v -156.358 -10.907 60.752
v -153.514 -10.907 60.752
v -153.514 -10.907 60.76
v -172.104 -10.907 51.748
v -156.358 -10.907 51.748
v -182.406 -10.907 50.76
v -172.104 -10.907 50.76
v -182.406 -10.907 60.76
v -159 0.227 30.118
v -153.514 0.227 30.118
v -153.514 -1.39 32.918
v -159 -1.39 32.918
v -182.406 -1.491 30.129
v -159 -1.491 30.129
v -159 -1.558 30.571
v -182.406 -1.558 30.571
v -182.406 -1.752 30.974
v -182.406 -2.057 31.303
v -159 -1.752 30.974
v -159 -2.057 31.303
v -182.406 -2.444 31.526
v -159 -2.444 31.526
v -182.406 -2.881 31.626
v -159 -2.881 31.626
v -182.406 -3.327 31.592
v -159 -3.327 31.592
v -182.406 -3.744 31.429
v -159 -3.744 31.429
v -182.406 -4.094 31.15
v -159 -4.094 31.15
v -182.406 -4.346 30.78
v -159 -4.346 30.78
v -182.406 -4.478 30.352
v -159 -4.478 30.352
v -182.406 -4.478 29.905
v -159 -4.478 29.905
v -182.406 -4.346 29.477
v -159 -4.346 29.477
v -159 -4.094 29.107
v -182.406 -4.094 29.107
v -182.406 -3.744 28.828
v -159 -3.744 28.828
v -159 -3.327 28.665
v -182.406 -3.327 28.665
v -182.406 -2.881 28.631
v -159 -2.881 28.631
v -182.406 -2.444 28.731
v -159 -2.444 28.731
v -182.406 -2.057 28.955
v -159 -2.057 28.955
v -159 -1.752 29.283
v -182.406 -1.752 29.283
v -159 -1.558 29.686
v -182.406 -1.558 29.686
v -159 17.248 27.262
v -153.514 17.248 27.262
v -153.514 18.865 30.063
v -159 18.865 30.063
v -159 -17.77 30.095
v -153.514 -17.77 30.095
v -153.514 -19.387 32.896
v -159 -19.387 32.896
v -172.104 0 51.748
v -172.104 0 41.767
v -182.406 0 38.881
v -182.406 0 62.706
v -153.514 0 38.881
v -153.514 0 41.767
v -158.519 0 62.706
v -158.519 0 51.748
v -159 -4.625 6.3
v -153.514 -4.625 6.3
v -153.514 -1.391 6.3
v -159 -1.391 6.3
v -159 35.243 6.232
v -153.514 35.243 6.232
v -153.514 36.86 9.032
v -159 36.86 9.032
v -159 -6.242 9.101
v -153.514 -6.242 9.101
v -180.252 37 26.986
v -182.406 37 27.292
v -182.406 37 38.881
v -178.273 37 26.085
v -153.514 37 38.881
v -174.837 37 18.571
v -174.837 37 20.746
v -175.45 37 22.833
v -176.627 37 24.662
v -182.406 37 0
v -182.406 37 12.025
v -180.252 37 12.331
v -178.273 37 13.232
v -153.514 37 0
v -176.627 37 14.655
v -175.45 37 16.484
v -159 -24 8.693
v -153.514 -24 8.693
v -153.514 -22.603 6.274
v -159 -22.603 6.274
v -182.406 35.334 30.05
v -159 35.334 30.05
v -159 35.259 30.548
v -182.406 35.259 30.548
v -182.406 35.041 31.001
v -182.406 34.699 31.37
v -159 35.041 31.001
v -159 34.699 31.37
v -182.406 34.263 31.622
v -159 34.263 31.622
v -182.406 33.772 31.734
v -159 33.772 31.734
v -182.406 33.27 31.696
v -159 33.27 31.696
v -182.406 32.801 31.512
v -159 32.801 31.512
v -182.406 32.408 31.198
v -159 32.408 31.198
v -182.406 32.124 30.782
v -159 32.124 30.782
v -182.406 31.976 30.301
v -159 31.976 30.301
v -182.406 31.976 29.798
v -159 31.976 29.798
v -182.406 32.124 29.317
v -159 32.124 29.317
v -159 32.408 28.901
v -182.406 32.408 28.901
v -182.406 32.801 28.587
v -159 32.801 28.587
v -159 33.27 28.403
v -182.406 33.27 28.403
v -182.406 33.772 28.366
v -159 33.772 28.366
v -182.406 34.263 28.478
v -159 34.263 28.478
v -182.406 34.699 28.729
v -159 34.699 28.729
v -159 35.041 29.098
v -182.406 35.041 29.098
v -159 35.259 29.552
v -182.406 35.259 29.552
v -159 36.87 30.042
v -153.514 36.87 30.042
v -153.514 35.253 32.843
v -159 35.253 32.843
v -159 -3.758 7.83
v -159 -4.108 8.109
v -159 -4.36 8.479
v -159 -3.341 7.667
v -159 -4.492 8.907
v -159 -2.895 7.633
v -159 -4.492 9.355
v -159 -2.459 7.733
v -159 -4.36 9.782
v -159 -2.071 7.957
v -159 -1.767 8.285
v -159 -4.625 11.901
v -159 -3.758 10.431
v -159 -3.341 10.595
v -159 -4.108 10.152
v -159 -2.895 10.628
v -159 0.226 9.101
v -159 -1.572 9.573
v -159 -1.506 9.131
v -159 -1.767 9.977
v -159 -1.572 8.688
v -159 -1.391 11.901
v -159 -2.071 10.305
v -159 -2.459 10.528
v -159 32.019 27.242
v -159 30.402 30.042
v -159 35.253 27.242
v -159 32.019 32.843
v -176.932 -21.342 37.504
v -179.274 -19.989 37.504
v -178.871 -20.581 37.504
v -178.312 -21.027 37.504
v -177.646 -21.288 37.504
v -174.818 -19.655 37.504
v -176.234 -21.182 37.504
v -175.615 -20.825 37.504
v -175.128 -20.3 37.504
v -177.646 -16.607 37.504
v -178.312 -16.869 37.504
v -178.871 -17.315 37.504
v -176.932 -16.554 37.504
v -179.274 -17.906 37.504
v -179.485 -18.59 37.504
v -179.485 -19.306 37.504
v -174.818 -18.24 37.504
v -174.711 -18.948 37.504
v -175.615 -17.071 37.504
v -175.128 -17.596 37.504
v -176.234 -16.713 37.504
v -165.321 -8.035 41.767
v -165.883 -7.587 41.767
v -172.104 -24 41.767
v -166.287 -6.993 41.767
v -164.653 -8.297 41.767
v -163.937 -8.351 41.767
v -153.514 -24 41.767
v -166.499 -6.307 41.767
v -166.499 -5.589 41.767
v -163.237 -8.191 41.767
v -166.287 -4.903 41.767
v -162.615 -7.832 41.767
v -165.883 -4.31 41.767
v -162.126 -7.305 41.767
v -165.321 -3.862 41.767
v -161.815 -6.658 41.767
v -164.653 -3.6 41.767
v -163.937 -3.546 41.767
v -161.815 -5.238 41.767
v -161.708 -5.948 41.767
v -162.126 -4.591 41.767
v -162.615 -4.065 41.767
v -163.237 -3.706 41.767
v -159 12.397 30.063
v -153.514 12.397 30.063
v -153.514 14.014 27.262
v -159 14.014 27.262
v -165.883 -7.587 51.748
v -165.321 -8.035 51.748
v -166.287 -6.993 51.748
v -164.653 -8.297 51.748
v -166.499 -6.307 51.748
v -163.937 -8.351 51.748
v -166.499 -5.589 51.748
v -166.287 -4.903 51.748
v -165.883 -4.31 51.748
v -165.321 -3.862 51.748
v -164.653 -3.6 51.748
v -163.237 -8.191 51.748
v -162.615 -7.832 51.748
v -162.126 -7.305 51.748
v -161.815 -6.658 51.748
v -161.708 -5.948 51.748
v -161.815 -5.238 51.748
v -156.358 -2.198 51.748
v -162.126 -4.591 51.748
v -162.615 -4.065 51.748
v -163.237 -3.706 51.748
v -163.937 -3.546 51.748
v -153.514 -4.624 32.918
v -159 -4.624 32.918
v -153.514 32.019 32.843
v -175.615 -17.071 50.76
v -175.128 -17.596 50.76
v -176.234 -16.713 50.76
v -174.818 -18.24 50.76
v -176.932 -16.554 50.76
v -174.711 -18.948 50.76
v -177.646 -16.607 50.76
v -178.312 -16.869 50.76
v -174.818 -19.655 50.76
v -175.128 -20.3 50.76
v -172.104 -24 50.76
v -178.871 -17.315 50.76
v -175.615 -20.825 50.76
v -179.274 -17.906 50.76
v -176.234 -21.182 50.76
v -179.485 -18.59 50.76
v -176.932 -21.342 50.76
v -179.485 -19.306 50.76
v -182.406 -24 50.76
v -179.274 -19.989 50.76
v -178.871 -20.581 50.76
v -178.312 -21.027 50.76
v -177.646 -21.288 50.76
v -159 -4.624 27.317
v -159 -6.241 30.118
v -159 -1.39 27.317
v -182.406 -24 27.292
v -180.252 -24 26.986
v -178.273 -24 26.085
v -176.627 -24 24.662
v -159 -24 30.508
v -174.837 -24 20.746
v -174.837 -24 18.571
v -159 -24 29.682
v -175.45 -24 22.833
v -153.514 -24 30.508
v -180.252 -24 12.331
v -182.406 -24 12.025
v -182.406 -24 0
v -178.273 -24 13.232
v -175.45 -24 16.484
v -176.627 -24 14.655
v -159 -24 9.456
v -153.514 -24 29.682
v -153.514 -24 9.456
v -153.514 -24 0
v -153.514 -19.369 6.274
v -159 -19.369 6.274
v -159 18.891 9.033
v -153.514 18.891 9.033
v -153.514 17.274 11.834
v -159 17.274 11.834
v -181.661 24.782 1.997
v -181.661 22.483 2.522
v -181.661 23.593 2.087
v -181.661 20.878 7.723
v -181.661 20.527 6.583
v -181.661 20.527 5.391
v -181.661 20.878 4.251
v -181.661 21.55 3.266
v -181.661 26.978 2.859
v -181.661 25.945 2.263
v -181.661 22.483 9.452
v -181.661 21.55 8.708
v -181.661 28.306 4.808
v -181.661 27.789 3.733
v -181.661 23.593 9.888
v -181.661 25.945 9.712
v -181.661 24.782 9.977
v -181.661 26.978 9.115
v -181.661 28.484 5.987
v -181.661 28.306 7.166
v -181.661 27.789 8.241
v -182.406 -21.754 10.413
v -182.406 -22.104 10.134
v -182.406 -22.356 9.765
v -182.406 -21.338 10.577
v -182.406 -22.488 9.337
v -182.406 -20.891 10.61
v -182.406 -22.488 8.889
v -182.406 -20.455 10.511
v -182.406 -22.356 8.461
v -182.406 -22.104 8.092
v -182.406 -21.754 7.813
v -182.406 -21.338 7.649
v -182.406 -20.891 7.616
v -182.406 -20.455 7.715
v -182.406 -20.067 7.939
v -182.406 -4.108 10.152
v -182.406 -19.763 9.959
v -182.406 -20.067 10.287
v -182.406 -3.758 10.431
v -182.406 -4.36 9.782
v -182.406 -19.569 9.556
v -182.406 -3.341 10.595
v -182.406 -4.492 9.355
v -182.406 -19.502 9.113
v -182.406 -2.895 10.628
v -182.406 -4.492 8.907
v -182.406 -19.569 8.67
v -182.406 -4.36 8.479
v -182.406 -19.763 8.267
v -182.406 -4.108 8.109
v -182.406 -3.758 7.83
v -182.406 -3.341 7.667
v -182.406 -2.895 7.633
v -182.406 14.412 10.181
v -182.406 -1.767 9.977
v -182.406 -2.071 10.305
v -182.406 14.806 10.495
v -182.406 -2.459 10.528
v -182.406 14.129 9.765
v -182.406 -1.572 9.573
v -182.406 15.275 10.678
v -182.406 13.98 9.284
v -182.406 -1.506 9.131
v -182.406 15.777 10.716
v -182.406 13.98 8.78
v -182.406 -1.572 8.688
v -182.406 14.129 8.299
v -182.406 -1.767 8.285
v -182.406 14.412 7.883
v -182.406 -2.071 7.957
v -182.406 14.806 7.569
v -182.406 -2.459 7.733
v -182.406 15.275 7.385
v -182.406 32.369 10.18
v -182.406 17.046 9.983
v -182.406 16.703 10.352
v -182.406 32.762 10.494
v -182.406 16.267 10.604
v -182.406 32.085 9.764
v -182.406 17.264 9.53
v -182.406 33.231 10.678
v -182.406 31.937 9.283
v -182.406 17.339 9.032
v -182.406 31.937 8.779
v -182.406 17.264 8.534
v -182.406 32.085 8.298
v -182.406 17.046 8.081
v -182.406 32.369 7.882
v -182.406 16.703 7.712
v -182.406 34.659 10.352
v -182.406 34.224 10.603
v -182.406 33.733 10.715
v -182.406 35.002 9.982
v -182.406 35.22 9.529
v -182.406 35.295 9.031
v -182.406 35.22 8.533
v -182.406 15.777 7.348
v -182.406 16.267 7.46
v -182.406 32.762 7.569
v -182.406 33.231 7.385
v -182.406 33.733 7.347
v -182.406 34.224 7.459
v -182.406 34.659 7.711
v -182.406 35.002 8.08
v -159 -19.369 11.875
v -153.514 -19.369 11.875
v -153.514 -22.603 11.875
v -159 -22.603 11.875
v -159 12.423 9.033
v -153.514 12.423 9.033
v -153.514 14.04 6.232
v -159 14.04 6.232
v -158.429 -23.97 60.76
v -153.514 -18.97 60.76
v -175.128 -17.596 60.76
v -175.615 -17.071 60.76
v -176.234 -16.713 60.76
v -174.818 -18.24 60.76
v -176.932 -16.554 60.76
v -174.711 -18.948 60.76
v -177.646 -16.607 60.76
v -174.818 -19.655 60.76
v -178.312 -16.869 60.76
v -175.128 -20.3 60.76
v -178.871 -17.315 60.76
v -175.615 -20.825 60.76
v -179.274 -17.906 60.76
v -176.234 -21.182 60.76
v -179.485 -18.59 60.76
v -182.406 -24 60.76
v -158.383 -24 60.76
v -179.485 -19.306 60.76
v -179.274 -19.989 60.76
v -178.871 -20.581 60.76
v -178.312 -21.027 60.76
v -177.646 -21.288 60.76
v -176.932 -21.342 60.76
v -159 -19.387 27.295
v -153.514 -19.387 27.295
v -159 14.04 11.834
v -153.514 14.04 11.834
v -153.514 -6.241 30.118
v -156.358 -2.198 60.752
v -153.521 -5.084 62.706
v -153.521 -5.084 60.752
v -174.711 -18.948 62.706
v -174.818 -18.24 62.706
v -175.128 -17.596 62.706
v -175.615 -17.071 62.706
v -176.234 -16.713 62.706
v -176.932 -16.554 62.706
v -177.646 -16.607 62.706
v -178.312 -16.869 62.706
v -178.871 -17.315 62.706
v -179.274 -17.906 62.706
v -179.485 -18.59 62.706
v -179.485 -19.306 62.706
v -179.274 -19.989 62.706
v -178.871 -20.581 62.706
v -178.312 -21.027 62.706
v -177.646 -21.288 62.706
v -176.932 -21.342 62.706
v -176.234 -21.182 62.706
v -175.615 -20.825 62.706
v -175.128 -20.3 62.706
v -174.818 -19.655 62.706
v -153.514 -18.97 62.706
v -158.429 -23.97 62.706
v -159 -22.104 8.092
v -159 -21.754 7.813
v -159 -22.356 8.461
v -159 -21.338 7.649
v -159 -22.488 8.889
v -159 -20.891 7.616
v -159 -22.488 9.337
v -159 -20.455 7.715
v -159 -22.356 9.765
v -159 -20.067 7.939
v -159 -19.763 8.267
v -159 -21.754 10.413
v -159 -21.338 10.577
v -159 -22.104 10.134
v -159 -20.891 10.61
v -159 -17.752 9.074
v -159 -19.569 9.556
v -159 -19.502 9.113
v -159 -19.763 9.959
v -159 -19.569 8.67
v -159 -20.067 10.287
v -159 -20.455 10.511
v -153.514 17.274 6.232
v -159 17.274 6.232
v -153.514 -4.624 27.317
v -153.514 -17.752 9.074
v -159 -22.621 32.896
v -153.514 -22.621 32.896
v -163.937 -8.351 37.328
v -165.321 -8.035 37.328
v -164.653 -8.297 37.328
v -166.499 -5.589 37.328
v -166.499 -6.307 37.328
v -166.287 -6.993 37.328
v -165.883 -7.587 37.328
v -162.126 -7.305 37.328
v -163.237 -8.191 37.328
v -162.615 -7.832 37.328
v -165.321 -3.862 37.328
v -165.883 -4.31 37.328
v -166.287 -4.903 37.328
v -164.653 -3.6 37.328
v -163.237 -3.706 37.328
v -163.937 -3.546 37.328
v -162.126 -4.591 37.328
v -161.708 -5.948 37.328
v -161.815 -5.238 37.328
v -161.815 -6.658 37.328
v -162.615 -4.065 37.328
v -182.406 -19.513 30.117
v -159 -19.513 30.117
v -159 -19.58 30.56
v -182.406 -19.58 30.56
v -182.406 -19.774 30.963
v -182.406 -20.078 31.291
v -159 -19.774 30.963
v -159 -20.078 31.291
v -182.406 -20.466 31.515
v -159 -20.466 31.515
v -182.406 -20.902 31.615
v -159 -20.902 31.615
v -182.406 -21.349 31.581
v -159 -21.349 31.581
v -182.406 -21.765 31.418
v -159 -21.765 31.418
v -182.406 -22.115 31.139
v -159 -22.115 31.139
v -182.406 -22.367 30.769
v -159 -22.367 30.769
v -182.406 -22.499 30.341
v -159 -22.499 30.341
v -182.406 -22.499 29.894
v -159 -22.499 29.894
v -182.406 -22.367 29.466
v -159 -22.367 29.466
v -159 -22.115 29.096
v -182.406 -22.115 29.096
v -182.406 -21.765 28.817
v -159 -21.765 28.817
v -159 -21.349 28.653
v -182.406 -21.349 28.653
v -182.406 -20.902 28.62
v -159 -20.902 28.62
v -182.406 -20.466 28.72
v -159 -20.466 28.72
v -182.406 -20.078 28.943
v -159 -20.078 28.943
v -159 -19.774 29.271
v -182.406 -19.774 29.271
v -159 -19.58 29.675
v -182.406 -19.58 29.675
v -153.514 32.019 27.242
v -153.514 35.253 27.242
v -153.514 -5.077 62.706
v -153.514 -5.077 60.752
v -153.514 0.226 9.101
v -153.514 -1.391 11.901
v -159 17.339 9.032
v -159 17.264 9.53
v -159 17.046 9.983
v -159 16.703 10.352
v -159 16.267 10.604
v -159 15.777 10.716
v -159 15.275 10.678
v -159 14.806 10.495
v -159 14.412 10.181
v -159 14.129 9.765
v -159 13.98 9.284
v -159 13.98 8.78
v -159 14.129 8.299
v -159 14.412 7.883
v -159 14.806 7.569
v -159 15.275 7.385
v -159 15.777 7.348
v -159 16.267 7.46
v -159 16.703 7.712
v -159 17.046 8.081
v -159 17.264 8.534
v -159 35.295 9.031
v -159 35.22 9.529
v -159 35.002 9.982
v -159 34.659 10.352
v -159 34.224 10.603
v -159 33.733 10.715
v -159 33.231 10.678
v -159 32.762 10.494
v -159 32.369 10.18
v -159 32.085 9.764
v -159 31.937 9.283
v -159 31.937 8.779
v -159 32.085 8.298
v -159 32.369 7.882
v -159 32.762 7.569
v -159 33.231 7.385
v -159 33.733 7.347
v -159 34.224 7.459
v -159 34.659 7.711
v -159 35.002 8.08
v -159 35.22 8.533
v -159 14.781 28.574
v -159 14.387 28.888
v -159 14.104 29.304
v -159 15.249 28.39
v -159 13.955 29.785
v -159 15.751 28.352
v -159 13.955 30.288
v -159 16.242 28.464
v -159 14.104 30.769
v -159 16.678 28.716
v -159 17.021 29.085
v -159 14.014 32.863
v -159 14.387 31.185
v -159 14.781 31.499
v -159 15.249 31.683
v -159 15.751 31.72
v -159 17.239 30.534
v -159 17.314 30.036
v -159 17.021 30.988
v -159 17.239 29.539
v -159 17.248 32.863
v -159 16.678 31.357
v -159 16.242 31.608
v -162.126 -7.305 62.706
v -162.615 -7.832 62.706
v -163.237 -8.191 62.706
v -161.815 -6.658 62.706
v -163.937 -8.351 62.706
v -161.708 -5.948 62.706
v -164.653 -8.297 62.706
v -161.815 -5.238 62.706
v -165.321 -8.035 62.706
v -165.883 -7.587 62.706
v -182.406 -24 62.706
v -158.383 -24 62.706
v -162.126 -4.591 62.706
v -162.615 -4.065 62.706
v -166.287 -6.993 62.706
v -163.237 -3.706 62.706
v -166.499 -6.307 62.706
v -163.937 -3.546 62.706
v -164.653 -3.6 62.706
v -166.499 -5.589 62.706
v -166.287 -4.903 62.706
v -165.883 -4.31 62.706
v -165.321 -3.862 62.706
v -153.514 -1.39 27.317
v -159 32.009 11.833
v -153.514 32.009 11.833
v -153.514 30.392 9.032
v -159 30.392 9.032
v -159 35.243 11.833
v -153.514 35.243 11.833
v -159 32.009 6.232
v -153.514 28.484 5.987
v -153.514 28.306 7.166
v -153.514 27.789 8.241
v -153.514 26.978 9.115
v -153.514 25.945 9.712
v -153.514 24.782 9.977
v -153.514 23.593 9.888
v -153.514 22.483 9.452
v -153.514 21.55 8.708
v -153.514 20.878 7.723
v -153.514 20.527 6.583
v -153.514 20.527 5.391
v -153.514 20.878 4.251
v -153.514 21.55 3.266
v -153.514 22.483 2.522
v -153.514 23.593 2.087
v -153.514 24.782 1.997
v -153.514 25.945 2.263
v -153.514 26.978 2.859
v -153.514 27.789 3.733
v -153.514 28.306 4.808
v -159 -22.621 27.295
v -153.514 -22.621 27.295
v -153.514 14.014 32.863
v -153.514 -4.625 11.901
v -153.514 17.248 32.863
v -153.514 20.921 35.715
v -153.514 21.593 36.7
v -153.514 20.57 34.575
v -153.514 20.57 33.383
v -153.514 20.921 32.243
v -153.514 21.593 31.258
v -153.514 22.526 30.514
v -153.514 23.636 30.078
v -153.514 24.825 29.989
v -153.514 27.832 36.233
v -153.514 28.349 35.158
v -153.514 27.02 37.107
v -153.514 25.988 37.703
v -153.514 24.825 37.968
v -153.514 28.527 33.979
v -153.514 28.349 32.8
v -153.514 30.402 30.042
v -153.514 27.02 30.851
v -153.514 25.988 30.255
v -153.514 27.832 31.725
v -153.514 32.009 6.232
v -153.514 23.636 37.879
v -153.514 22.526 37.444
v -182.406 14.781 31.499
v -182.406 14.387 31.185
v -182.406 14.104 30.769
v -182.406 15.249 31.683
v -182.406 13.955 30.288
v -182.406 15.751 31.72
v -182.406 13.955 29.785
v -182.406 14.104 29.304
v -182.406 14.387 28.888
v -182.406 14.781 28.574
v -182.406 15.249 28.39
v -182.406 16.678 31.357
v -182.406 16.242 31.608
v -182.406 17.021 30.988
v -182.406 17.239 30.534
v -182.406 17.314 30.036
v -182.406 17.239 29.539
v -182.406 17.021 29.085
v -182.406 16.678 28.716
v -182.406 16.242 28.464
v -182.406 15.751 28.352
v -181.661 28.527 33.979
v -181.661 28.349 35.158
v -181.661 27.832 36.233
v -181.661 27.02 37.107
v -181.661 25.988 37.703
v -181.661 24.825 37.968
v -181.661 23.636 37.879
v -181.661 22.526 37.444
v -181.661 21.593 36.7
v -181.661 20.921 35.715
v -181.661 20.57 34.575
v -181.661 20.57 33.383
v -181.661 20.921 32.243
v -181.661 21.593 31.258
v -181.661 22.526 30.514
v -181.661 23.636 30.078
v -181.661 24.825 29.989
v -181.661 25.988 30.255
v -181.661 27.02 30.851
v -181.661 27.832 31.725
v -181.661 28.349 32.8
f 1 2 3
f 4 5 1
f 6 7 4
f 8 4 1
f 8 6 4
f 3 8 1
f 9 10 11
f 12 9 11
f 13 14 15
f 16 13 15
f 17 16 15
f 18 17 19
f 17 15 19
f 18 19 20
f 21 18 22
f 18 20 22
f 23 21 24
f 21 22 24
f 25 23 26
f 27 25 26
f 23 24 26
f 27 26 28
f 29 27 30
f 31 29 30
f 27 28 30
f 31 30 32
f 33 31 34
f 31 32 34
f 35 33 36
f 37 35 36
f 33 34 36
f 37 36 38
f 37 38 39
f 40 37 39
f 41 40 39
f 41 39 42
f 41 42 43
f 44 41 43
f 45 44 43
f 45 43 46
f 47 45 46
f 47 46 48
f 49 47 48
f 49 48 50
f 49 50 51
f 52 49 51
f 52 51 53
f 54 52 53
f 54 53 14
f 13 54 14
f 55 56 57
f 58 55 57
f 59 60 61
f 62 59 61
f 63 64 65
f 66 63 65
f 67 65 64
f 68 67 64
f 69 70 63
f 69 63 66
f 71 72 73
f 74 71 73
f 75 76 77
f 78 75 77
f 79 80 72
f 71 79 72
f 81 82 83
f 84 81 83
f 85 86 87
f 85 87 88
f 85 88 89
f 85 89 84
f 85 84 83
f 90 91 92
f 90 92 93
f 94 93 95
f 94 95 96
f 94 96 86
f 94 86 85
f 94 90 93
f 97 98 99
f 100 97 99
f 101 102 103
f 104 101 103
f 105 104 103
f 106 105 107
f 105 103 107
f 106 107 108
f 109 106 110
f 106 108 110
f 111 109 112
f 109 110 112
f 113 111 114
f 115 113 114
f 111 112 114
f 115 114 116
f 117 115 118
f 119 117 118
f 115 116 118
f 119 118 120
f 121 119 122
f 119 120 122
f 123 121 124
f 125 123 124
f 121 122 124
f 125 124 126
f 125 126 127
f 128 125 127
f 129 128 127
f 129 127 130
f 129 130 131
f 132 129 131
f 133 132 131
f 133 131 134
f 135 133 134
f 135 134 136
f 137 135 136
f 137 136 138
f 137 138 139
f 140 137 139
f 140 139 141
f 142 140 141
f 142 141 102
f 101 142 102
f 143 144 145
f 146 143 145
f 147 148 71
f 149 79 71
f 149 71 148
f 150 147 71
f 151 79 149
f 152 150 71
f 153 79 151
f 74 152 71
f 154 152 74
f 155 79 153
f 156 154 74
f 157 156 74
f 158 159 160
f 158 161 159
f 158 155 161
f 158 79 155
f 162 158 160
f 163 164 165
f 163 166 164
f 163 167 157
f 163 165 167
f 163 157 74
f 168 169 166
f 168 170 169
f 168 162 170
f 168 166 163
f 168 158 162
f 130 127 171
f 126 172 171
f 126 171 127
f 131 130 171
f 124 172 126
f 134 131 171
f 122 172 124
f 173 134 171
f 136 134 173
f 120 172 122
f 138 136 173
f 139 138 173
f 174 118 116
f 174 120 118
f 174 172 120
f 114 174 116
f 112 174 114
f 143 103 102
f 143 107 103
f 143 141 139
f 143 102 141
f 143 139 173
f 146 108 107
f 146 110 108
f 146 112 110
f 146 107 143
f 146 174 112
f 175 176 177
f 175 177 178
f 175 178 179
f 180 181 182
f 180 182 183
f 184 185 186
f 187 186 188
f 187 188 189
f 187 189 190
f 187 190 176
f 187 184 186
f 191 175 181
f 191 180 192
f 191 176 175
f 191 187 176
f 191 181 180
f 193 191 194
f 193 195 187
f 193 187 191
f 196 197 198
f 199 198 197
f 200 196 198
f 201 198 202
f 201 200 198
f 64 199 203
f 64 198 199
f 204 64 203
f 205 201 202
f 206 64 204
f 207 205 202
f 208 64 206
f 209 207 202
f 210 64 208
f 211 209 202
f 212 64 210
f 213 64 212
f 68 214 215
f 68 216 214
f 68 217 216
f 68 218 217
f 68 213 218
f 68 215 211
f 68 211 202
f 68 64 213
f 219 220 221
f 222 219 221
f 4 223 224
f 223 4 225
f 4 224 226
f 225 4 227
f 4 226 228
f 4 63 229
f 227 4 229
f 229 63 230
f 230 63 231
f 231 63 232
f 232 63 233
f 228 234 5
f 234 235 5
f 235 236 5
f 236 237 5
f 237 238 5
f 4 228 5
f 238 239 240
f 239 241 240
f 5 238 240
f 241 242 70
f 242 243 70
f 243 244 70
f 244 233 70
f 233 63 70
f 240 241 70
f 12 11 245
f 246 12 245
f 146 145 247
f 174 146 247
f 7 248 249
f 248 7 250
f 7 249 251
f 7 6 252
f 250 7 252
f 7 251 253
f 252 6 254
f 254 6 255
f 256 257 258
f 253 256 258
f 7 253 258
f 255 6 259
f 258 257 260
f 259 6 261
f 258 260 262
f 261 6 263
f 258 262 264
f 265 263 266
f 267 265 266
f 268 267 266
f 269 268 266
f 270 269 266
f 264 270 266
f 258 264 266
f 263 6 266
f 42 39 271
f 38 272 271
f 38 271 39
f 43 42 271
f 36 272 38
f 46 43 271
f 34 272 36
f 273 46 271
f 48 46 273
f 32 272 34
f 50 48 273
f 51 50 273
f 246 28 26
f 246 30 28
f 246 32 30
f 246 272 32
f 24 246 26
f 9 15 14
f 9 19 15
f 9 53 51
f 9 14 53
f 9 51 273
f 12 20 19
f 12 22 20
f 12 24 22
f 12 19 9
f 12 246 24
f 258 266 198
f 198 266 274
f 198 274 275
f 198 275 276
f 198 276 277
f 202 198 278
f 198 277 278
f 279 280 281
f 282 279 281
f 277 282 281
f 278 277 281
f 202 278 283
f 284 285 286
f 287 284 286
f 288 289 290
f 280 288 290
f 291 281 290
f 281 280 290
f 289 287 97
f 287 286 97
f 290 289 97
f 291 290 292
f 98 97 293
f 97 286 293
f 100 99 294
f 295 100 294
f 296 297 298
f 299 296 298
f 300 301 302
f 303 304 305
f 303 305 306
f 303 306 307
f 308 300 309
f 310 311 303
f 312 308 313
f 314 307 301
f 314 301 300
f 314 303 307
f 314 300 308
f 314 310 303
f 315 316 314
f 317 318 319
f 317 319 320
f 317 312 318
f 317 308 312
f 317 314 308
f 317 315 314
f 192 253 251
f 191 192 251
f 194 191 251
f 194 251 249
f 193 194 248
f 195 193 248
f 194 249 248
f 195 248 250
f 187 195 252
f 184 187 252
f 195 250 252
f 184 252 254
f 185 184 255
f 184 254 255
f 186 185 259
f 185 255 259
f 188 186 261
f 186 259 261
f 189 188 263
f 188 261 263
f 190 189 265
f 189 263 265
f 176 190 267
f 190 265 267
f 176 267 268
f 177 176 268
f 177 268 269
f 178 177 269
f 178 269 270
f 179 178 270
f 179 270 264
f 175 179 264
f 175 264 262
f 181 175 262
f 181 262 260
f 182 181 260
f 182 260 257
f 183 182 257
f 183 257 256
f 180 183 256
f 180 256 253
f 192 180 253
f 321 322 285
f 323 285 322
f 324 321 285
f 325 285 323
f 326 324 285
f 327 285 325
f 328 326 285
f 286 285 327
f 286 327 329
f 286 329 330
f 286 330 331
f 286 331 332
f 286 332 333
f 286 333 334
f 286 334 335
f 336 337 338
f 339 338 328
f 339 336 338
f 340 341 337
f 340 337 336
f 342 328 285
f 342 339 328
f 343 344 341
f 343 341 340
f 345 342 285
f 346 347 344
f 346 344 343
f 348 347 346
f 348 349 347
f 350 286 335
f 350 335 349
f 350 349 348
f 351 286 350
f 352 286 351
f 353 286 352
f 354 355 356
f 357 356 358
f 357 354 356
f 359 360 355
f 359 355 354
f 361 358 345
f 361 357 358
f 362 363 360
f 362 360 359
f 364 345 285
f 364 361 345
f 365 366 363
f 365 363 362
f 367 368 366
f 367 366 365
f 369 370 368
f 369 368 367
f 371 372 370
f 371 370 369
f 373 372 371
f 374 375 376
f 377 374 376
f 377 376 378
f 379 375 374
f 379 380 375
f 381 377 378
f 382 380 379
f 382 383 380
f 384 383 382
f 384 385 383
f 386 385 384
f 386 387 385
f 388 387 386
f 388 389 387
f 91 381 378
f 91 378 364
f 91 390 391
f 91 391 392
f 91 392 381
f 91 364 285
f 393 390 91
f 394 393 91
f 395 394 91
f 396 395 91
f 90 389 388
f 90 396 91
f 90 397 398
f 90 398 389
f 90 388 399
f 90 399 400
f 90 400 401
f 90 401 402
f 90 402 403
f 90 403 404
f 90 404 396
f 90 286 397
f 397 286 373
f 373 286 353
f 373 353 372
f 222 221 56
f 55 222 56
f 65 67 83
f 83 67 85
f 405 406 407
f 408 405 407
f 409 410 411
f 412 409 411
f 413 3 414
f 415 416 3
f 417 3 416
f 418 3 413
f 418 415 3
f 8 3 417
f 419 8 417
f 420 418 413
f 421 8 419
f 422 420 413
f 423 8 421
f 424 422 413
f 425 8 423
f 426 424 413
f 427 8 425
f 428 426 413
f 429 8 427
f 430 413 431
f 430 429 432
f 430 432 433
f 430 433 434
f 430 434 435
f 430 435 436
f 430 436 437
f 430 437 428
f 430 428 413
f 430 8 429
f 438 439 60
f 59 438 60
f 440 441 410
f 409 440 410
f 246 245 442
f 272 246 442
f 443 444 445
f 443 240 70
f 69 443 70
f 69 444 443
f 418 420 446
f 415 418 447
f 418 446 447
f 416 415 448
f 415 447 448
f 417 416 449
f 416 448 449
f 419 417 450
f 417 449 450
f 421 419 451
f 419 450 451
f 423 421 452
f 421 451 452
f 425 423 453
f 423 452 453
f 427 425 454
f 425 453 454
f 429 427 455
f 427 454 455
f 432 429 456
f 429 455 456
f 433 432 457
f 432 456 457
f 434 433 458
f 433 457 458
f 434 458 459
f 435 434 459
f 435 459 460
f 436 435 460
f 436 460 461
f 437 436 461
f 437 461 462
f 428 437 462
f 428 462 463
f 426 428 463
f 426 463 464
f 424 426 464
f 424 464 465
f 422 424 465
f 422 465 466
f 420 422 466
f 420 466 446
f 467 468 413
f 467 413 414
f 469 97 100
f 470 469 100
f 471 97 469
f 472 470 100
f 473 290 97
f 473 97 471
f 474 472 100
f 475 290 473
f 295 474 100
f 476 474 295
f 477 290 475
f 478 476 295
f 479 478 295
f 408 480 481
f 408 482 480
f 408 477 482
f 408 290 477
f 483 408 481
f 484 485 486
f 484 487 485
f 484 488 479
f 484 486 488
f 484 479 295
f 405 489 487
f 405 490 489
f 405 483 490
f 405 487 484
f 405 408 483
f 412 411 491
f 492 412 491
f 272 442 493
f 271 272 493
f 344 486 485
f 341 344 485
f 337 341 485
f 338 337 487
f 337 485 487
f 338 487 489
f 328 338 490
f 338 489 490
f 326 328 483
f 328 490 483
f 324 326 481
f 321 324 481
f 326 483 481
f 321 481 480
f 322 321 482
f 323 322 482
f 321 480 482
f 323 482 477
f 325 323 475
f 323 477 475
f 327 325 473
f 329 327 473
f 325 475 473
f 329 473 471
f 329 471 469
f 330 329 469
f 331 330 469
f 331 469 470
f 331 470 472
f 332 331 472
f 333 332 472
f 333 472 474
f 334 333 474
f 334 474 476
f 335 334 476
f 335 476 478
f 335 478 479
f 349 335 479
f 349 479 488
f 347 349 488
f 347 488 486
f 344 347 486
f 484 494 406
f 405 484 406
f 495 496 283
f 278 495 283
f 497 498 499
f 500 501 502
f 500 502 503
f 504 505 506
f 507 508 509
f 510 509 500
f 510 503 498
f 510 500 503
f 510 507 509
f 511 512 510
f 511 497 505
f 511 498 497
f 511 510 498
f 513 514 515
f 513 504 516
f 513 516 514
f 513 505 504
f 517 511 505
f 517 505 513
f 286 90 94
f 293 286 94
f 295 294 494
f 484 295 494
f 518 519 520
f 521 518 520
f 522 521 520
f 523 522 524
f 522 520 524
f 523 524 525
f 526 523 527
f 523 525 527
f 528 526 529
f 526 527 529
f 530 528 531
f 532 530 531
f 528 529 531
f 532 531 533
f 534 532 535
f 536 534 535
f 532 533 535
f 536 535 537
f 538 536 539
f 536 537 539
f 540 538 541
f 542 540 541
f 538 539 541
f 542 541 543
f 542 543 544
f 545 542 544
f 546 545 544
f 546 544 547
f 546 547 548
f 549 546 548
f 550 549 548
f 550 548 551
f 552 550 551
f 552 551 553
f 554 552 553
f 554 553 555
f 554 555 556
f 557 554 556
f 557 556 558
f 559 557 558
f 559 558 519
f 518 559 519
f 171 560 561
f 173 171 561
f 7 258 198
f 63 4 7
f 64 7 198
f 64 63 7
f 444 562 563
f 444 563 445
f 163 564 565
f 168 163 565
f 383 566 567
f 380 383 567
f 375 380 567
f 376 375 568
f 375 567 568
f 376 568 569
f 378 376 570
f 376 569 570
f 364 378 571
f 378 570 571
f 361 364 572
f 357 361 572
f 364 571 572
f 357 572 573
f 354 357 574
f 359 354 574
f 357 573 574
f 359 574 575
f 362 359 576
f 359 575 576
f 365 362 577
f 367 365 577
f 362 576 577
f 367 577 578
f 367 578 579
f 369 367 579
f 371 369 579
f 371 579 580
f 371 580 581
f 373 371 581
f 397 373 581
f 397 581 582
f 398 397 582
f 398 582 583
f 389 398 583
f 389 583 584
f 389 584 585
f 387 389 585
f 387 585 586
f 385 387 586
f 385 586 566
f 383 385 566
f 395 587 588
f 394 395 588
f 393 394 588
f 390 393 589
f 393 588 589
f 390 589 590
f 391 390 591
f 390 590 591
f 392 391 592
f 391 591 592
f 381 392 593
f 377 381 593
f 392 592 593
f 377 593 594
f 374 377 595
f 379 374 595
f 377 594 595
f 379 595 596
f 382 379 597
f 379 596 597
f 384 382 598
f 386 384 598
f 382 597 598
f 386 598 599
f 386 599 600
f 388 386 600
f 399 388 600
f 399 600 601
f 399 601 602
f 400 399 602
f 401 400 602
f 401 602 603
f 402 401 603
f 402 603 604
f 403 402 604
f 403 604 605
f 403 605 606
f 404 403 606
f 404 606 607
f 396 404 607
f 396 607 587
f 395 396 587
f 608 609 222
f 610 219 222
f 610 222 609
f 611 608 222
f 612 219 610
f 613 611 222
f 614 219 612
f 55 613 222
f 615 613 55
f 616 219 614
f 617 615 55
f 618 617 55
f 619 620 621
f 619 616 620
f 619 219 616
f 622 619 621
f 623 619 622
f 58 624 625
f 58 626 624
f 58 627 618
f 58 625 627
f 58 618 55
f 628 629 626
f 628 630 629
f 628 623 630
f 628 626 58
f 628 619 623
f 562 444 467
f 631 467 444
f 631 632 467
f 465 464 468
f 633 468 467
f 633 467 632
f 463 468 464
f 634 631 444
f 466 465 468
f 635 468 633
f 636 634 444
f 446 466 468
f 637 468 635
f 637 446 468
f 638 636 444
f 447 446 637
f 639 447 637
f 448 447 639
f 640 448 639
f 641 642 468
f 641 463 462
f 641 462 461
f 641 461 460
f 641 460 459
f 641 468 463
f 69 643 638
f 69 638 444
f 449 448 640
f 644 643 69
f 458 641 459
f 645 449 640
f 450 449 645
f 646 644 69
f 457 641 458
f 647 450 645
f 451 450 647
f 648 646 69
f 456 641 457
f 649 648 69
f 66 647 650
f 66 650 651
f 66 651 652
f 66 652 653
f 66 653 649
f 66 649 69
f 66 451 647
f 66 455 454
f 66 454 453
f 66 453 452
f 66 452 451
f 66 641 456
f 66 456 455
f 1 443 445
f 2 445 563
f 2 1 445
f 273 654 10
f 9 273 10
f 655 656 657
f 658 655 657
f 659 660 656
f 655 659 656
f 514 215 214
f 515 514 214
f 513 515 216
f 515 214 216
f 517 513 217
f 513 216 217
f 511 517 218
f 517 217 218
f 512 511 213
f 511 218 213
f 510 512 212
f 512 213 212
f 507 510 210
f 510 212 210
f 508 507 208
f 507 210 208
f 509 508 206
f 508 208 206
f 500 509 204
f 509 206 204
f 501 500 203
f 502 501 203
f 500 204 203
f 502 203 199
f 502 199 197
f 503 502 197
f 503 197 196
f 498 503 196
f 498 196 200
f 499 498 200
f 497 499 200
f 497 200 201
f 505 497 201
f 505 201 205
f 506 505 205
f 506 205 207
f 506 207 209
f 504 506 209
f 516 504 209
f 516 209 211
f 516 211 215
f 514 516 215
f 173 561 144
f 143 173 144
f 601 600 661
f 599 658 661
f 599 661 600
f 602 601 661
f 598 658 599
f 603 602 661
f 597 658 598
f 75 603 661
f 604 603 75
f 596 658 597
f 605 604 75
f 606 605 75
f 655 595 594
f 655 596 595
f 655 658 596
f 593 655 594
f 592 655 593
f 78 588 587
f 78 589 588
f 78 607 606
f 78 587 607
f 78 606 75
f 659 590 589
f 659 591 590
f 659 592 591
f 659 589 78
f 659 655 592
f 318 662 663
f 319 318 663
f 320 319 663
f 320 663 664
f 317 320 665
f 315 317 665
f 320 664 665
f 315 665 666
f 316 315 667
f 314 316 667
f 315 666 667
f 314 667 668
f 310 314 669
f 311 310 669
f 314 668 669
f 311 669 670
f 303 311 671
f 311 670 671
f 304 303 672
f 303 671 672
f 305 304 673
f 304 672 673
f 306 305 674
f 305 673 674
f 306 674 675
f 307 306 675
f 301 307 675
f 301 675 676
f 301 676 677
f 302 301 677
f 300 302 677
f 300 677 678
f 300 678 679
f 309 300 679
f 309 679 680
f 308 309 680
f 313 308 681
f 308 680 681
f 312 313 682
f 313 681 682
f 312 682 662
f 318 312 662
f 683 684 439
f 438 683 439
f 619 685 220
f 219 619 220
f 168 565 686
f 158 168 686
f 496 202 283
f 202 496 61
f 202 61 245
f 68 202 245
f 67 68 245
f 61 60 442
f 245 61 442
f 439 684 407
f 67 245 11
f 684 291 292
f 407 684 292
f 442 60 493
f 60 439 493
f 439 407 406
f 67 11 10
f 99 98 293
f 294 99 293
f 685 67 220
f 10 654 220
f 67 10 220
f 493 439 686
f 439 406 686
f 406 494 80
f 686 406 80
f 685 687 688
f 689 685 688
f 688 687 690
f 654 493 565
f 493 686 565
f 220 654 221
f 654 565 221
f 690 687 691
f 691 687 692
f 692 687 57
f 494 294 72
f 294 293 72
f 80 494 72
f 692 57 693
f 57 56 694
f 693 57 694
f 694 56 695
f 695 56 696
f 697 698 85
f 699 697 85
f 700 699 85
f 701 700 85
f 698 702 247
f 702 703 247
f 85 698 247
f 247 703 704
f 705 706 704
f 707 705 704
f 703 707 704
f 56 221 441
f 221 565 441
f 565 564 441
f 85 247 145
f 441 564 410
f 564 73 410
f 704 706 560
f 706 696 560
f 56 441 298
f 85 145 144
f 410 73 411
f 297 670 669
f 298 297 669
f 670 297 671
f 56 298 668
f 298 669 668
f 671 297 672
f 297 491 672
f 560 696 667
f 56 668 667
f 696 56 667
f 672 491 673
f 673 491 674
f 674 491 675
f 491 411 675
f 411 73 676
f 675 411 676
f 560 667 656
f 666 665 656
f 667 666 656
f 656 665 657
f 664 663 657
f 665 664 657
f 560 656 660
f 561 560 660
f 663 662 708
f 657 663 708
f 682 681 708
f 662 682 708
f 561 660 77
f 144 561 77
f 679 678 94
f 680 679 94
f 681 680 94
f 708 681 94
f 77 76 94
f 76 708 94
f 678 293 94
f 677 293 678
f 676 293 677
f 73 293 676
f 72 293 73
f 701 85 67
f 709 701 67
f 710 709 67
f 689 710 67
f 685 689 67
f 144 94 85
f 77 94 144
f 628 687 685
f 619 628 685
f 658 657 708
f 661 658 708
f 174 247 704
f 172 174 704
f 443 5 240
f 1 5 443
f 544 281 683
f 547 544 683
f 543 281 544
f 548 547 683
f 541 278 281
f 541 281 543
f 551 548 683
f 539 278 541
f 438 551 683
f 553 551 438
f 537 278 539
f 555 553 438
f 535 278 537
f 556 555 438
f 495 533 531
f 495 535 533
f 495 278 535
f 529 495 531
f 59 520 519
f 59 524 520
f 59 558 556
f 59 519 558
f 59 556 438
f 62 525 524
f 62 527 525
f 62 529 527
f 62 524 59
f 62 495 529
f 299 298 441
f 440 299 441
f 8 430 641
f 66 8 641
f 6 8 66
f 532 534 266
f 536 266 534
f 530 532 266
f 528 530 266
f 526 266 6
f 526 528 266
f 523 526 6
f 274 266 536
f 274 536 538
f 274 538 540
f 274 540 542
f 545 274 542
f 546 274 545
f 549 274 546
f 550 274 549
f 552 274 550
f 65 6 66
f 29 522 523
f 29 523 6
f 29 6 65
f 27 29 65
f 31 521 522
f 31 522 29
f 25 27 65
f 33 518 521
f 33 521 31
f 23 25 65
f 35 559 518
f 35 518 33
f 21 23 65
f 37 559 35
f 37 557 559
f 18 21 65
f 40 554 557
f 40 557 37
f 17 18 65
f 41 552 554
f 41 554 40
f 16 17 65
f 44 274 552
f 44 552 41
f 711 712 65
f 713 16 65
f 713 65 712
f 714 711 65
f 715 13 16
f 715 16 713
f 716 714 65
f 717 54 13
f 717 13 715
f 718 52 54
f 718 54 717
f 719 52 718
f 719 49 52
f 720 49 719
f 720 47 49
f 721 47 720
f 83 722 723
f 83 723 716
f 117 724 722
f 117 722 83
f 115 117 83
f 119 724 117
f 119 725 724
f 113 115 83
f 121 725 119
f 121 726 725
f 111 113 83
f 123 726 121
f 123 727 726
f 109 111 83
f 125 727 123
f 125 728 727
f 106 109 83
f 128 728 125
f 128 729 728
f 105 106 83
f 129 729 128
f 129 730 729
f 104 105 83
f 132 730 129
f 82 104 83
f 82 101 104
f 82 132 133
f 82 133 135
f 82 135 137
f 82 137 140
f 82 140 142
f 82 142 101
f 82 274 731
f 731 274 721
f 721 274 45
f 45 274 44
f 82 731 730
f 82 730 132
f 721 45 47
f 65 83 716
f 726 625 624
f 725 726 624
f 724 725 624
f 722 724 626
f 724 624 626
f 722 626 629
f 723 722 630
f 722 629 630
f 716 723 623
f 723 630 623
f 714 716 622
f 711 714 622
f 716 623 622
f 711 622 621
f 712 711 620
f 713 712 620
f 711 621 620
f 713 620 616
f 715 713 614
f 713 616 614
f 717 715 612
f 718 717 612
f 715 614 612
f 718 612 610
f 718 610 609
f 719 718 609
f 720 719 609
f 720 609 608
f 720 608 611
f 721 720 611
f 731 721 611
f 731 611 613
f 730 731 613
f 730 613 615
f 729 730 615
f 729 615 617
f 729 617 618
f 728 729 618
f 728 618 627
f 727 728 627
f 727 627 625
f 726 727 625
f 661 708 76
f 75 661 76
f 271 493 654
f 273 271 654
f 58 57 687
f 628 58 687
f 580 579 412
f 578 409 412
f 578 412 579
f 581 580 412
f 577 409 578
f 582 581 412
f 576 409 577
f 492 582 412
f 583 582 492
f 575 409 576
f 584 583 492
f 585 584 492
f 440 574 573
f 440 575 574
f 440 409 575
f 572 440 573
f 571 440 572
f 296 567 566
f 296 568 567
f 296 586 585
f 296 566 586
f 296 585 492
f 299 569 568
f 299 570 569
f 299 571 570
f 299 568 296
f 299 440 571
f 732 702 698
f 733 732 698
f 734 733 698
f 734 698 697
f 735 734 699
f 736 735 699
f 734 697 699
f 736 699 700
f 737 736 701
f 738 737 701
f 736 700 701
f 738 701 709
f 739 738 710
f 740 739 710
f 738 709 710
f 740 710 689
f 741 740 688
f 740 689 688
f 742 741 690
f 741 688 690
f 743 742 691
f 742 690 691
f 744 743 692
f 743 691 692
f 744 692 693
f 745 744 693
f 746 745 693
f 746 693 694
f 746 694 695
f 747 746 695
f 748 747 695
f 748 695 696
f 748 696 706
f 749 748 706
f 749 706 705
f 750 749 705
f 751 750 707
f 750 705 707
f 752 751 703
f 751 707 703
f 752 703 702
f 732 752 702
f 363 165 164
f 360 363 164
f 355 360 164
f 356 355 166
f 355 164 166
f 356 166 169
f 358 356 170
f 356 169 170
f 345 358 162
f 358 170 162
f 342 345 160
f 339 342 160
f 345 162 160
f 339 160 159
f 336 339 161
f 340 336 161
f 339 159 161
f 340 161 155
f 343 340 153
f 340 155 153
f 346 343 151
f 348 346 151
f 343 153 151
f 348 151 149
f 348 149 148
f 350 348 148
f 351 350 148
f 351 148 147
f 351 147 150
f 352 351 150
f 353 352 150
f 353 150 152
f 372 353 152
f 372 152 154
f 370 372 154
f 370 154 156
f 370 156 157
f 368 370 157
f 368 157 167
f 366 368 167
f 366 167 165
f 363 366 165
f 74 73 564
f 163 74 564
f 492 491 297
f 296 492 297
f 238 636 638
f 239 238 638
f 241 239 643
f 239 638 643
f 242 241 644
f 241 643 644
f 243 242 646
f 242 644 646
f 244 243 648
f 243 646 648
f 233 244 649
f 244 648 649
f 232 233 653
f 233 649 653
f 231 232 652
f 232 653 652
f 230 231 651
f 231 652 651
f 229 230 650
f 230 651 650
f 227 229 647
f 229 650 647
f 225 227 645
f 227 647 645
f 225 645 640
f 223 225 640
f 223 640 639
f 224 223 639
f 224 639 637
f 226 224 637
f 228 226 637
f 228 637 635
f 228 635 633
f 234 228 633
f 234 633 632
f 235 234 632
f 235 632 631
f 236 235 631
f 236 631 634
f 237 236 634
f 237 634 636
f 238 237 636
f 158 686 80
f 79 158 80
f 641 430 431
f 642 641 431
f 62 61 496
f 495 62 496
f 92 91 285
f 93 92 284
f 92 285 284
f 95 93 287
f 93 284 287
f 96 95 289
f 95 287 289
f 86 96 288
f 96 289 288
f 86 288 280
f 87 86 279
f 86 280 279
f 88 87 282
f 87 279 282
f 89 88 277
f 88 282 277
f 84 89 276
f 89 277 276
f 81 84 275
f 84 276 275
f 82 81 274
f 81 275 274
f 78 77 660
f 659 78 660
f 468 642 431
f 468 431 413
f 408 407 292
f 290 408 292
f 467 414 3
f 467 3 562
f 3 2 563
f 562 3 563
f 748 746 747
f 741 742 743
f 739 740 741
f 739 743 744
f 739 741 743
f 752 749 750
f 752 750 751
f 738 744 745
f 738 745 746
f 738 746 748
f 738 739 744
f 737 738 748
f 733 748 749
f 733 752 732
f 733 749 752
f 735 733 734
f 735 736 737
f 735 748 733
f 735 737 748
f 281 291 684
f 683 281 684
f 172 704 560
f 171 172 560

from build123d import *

# Parameters (mm, degrees)
SKETCH_W             = 28.891708
SKETCH_H             = 61.000002
PAD_DEPTH            = 64.706
POCKET_DEPTH         = 5.486
SKETCH002_R          = 4.000759
SKETCH002_R_2        = 4.000904
POCKET013_DEPTH      = 28.147
SKETCH003_R          = 7.633881
POCKET014_DEPTH      = 90
SKETCH004_R          = 1.501587
SKETCH004_R_2        = 1.6888463945
SKETCH004_R_3        = 1.688846
POCKET015_DEPTH      = 71
SKETCH005_W          = 61.94006
SKETCH005_H          = 58.87719
POCKET016_DEPTH      = 34
SKETCH006_W          = 11.564612
SKETCH006_H          = 9.981083
POCKET017_DEPTH      = 18.59
POCKET018_DEPTH      = 14
SKETCH008_W          = 13.093784
SKETCH008_H          = 9.999417
POCKET019_DEPTH      = 38
POCKET019_FACE20_W   = 18.59
POCKET019_FACE20_H   = 9.981083
POCKET020_DEPTH      = 21
SKETCH009_R          = 2.400503
POCKET021_DEPTH      = 27.202
SKETCH010_R          = 2.409031
POCKET022_DEPTH      = 27.378
SKETCH011_W          = 3.434418
SKETCH011_H          = 9.662621
POCKET023_DEPTH      = 54
POCKET023_FACE73_R   = 2.400503
POCKET023_FACE73_R_2 = 2.409031
POCKET024_DEPTH      = 2


with BuildPart() as part:
    # Sketch → Pad (new body)
    with BuildSketch(Plane.XY):
        with Locations((-167.960045, 6.499999)):
            Rectangle(SKETCH_W, SKETCH_H)
    extrude(amount=PAD_DEPTH)

    # Sketch001 (on Face2 of Pad) → Pocket (cut)
    with BuildSketch(Plane.YZ.offset(-153.514191)):
        Polygon((0.227114, 30.1176869999), (-1.3898859999, 32.9184131558), (-4.6238859999, 32.9184131559), (-6.240886, 30.1176870001), (-4.6238860001, 27.3169608442), (-1.3898860001, 27.3169608441), align=None)
        Polygon((18.864944, 30.0627266883), (17.2479442699, 32.863453), (14.0139442699, 32.8634533117), (12.396944, 30.0627273117), (14.0139437301, 27.262001), (17.2479437301, 27.2620006883), align=None)
        Polygon((36.870486, 30.0424916883), (35.2534862699, 32.843218), (32.0194862699, 32.8432183117), (30.402486, 30.0424923117), (32.0194857301, 27.241766), (35.2534857301, 27.2417656883), align=None)
        Polygon((-17.752086, 9.074409), (-19.369086, 11.8751351559), (-22.603086, 11.8751351558), (-24.220086, 9.074409), (-22.603086, 6.2736828441), (-19.369086, 6.2736828442), align=None)
        Polygon((0.225859, 9.1006766883), (-1.3911407301, 11.901403), (-4.6251407301, 11.9014033117), (-6.242141, 9.1006773117), (-4.6251412699, 6.299951), (-1.3911412699, 6.2999506883), align=None)
        Polygon((36.86032, 9.0323376883), (35.2433202699, 11.833064), (32.0093202699, 11.8330643117), (30.39232, 9.0323383117), (32.0093197301, 6.231612), (35.2433197301, 6.2316116883), align=None)
        Polygon((18.890709, 9.0329989998), (17.2737090002, 11.8337251557), (14.0397090002, 11.8337251559), (12.422709, 9.0329990002), (14.0397089998, 6.2322728443), (17.2737089998, 6.2322728441), align=None)
        Polygon((-17.770354, 30.0952738442), (-19.387354, 32.896), (-22.621354, 32.896), (-24.238354, 30.0952738442), (-22.621354, 27.2945476883), (-19.387354, 27.2945476883), align=None)
    extrude(amount=-POCKET_DEPTH, mode=Mode.SUBTRACT)

    # Sketch002 (on Face3 of Pocket) → Pocket013 (cut)
    with BuildSketch(Plane.YZ.offset(-153.514191)):
        with Locations((24.525928, 33.978888)):
            Circle(SKETCH002_R)
        with Locations((24.483081, 5.987167)):
            Circle(SKETCH002_R_2)
    extrude(amount=-POCKET013_DEPTH, mode=Mode.SUBTRACT)

    # Sketch003 (on Face1 of Pocket013) → Pocket014 (cut)
    with BuildSketch(Plane.XZ.offset(24.000002)):
        with Locations((-182.392539, 19.658504)):
            Circle(SKETCH003_R)
    extrude(amount=-POCKET014_DEPTH, mode=Mode.SUBTRACT)

    # Sketch004 (on Face3 of Pocket014) → Pocket015 (cut)
    with BuildSketch(Plane.YZ.offset(-153.514191)):
        with Locations((-2.992992, 30.128542)):
            Circle(SKETCH004_R)
        with Locations((15.650433, 9.031955)):
            Circle(SKETCH004_R_2)
        with Locations((-21.003469, 9.112989)):
            Circle(SKETCH004_R)
        with Locations((-3.007213, 9.130702)):
            Circle(SKETCH004_R)
        with Locations((-21.01451, 30.1173)):
            Circle(SKETCH004_R)
        with Locations((33.645615, 30.049736)):
            Circle(SKETCH004_R_3)
        with Locations((33.606518, 9.031116)):
            Circle(SKETCH004_R_3)
        with Locations((15.625216, 30.036369)):
            Circle(SKETCH004_R_3)
    extrude(amount=-POCKET015_DEPTH, mode=Mode.SUBTRACT)

    # Sketch005 (on Face3 of Pocket015) → Pocket016 (cut)
    with BuildSketch(Plane.YZ.offset(-153.514191)):
        with Locations((30.97003, 68.319813)):
            Rectangle(SKETCH005_W, SKETCH005_H)
    extrude(amount=-POCKET016_DEPTH, mode=Mode.SUBTRACT)

    # Sketch006 (on Face3 of Pocket016) → Pocket017 (cut)
    with BuildSketch(Plane.YZ.offset(-153.514191)):
        with Locations((-5.122813, 46.7572385)):
            Rectangle(SKETCH006_W, SKETCH006_H)
    extrude(amount=-POCKET017_DEPTH, mode=Mode.SUBTRACT)

    # Sketch007 (on Face10 of Pocket017) → Pocket018 (cut)
    with BuildSketch(Plane.XY.offset(64.706)):
        Polygon((-158.429092, -23.970312), (-153.252335, -18.703115), (-151.097504, -28.69935), align=None)
        Polygon((-153.520828, -5.084184), (-159.130096, 0.622078), (-148.158478, 1.033419), align=None)
    extrude(amount=-POCKET018_DEPTH, mode=Mode.SUBTRACT)

    # Sketch008 (on Face13 of Pocket018) → Pocket019 (cut)
    with BuildSketch(Plane(origin=(-182.405899, 0, 0), x_dir=(0, -1, 0), z_dir=(-1, 0, 0))):
        with Locations((17.453488, 55.7602025)):
            Rectangle(SKETCH008_W, SKETCH008_H)
    extrude(amount=-POCKET019_DEPTH, mode=Mode.SUBTRACT)

    # Pocket019 Face20 → Pocket020 (cut)
    with BuildSketch(Plane(origin=(-162.809191, -10.905119, 46.7572385), x_dir=(1, 0, 0), z_dir=(0, 1, 0))):
        Rectangle(POCKET019_FACE20_W, POCKET019_FACE20_H)
    extrude(amount=-POCKET020_DEPTH, mode=Mode.SUBTRACT)

    # Sketch009 (on Face68 of Pocket020) → Pocket021 (cut)
    with BuildSketch(Plane.XY.offset(64.706)):
        with Locations((-177.111391, -18.947801)):
            Circle(SKETCH009_R)
    extrude(amount=-POCKET021_DEPTH, mode=Mode.SUBTRACT)

    # Sketch010 (on Face72 of Pocket021) → Pocket022 (cut)
    with BuildSketch(Plane.XY.offset(64.706)):
        with Locations((-164.116726, -5.948229)):
            Circle(SKETCH010_R)
    extrude(amount=-POCKET022_DEPTH, mode=Mode.SUBTRACT)

    # Sketch011 (on Face1 of Pocket022) → Pocket023 (cut)
    with BuildSketch(Plane.XZ.offset(24.000002)):
        with Locations((-154.641205, 55.9206505)):
            Rectangle(SKETCH011_W, SKETCH011_H)
    extrude(amount=-POCKET023_DEPTH, mode=Mode.SUBTRACT)

    # Pocket023 Face73 → Pocket024 (cut)
    with BuildSketch(Plane(origin=(-168.318188921, -11.9801298357, 64.706), x_dir=(0, 1, 0), z_dir=(0, 0, 1))):
        Polygon((11.9801298357, -9.7995969527), (11.9801298357, 14.087710079), (-12.0198721643, 14.087710079), (-12.0198721643, -9.935126335), (-11.9901821643, -9.889096921), (-6.9894158925, -14.803997921), (6.9035176151, -14.803997921), (6.8959458357, -14.797360921), align=None)
        with Locations((-6.9676711643, 8.793202079)):
            Circle(POCKET023_FACE73_R, mode=Mode.SUBTRACT)
        with Locations((6.0319008357, -4.201462921)):
            Circle(POCKET023_FACE73_R_2, mode=Mode.SUBTRACT)
    extrude(amount=-POCKET024_DEPTH, mode=Mode.SUBTRACT)


solid = part.part
